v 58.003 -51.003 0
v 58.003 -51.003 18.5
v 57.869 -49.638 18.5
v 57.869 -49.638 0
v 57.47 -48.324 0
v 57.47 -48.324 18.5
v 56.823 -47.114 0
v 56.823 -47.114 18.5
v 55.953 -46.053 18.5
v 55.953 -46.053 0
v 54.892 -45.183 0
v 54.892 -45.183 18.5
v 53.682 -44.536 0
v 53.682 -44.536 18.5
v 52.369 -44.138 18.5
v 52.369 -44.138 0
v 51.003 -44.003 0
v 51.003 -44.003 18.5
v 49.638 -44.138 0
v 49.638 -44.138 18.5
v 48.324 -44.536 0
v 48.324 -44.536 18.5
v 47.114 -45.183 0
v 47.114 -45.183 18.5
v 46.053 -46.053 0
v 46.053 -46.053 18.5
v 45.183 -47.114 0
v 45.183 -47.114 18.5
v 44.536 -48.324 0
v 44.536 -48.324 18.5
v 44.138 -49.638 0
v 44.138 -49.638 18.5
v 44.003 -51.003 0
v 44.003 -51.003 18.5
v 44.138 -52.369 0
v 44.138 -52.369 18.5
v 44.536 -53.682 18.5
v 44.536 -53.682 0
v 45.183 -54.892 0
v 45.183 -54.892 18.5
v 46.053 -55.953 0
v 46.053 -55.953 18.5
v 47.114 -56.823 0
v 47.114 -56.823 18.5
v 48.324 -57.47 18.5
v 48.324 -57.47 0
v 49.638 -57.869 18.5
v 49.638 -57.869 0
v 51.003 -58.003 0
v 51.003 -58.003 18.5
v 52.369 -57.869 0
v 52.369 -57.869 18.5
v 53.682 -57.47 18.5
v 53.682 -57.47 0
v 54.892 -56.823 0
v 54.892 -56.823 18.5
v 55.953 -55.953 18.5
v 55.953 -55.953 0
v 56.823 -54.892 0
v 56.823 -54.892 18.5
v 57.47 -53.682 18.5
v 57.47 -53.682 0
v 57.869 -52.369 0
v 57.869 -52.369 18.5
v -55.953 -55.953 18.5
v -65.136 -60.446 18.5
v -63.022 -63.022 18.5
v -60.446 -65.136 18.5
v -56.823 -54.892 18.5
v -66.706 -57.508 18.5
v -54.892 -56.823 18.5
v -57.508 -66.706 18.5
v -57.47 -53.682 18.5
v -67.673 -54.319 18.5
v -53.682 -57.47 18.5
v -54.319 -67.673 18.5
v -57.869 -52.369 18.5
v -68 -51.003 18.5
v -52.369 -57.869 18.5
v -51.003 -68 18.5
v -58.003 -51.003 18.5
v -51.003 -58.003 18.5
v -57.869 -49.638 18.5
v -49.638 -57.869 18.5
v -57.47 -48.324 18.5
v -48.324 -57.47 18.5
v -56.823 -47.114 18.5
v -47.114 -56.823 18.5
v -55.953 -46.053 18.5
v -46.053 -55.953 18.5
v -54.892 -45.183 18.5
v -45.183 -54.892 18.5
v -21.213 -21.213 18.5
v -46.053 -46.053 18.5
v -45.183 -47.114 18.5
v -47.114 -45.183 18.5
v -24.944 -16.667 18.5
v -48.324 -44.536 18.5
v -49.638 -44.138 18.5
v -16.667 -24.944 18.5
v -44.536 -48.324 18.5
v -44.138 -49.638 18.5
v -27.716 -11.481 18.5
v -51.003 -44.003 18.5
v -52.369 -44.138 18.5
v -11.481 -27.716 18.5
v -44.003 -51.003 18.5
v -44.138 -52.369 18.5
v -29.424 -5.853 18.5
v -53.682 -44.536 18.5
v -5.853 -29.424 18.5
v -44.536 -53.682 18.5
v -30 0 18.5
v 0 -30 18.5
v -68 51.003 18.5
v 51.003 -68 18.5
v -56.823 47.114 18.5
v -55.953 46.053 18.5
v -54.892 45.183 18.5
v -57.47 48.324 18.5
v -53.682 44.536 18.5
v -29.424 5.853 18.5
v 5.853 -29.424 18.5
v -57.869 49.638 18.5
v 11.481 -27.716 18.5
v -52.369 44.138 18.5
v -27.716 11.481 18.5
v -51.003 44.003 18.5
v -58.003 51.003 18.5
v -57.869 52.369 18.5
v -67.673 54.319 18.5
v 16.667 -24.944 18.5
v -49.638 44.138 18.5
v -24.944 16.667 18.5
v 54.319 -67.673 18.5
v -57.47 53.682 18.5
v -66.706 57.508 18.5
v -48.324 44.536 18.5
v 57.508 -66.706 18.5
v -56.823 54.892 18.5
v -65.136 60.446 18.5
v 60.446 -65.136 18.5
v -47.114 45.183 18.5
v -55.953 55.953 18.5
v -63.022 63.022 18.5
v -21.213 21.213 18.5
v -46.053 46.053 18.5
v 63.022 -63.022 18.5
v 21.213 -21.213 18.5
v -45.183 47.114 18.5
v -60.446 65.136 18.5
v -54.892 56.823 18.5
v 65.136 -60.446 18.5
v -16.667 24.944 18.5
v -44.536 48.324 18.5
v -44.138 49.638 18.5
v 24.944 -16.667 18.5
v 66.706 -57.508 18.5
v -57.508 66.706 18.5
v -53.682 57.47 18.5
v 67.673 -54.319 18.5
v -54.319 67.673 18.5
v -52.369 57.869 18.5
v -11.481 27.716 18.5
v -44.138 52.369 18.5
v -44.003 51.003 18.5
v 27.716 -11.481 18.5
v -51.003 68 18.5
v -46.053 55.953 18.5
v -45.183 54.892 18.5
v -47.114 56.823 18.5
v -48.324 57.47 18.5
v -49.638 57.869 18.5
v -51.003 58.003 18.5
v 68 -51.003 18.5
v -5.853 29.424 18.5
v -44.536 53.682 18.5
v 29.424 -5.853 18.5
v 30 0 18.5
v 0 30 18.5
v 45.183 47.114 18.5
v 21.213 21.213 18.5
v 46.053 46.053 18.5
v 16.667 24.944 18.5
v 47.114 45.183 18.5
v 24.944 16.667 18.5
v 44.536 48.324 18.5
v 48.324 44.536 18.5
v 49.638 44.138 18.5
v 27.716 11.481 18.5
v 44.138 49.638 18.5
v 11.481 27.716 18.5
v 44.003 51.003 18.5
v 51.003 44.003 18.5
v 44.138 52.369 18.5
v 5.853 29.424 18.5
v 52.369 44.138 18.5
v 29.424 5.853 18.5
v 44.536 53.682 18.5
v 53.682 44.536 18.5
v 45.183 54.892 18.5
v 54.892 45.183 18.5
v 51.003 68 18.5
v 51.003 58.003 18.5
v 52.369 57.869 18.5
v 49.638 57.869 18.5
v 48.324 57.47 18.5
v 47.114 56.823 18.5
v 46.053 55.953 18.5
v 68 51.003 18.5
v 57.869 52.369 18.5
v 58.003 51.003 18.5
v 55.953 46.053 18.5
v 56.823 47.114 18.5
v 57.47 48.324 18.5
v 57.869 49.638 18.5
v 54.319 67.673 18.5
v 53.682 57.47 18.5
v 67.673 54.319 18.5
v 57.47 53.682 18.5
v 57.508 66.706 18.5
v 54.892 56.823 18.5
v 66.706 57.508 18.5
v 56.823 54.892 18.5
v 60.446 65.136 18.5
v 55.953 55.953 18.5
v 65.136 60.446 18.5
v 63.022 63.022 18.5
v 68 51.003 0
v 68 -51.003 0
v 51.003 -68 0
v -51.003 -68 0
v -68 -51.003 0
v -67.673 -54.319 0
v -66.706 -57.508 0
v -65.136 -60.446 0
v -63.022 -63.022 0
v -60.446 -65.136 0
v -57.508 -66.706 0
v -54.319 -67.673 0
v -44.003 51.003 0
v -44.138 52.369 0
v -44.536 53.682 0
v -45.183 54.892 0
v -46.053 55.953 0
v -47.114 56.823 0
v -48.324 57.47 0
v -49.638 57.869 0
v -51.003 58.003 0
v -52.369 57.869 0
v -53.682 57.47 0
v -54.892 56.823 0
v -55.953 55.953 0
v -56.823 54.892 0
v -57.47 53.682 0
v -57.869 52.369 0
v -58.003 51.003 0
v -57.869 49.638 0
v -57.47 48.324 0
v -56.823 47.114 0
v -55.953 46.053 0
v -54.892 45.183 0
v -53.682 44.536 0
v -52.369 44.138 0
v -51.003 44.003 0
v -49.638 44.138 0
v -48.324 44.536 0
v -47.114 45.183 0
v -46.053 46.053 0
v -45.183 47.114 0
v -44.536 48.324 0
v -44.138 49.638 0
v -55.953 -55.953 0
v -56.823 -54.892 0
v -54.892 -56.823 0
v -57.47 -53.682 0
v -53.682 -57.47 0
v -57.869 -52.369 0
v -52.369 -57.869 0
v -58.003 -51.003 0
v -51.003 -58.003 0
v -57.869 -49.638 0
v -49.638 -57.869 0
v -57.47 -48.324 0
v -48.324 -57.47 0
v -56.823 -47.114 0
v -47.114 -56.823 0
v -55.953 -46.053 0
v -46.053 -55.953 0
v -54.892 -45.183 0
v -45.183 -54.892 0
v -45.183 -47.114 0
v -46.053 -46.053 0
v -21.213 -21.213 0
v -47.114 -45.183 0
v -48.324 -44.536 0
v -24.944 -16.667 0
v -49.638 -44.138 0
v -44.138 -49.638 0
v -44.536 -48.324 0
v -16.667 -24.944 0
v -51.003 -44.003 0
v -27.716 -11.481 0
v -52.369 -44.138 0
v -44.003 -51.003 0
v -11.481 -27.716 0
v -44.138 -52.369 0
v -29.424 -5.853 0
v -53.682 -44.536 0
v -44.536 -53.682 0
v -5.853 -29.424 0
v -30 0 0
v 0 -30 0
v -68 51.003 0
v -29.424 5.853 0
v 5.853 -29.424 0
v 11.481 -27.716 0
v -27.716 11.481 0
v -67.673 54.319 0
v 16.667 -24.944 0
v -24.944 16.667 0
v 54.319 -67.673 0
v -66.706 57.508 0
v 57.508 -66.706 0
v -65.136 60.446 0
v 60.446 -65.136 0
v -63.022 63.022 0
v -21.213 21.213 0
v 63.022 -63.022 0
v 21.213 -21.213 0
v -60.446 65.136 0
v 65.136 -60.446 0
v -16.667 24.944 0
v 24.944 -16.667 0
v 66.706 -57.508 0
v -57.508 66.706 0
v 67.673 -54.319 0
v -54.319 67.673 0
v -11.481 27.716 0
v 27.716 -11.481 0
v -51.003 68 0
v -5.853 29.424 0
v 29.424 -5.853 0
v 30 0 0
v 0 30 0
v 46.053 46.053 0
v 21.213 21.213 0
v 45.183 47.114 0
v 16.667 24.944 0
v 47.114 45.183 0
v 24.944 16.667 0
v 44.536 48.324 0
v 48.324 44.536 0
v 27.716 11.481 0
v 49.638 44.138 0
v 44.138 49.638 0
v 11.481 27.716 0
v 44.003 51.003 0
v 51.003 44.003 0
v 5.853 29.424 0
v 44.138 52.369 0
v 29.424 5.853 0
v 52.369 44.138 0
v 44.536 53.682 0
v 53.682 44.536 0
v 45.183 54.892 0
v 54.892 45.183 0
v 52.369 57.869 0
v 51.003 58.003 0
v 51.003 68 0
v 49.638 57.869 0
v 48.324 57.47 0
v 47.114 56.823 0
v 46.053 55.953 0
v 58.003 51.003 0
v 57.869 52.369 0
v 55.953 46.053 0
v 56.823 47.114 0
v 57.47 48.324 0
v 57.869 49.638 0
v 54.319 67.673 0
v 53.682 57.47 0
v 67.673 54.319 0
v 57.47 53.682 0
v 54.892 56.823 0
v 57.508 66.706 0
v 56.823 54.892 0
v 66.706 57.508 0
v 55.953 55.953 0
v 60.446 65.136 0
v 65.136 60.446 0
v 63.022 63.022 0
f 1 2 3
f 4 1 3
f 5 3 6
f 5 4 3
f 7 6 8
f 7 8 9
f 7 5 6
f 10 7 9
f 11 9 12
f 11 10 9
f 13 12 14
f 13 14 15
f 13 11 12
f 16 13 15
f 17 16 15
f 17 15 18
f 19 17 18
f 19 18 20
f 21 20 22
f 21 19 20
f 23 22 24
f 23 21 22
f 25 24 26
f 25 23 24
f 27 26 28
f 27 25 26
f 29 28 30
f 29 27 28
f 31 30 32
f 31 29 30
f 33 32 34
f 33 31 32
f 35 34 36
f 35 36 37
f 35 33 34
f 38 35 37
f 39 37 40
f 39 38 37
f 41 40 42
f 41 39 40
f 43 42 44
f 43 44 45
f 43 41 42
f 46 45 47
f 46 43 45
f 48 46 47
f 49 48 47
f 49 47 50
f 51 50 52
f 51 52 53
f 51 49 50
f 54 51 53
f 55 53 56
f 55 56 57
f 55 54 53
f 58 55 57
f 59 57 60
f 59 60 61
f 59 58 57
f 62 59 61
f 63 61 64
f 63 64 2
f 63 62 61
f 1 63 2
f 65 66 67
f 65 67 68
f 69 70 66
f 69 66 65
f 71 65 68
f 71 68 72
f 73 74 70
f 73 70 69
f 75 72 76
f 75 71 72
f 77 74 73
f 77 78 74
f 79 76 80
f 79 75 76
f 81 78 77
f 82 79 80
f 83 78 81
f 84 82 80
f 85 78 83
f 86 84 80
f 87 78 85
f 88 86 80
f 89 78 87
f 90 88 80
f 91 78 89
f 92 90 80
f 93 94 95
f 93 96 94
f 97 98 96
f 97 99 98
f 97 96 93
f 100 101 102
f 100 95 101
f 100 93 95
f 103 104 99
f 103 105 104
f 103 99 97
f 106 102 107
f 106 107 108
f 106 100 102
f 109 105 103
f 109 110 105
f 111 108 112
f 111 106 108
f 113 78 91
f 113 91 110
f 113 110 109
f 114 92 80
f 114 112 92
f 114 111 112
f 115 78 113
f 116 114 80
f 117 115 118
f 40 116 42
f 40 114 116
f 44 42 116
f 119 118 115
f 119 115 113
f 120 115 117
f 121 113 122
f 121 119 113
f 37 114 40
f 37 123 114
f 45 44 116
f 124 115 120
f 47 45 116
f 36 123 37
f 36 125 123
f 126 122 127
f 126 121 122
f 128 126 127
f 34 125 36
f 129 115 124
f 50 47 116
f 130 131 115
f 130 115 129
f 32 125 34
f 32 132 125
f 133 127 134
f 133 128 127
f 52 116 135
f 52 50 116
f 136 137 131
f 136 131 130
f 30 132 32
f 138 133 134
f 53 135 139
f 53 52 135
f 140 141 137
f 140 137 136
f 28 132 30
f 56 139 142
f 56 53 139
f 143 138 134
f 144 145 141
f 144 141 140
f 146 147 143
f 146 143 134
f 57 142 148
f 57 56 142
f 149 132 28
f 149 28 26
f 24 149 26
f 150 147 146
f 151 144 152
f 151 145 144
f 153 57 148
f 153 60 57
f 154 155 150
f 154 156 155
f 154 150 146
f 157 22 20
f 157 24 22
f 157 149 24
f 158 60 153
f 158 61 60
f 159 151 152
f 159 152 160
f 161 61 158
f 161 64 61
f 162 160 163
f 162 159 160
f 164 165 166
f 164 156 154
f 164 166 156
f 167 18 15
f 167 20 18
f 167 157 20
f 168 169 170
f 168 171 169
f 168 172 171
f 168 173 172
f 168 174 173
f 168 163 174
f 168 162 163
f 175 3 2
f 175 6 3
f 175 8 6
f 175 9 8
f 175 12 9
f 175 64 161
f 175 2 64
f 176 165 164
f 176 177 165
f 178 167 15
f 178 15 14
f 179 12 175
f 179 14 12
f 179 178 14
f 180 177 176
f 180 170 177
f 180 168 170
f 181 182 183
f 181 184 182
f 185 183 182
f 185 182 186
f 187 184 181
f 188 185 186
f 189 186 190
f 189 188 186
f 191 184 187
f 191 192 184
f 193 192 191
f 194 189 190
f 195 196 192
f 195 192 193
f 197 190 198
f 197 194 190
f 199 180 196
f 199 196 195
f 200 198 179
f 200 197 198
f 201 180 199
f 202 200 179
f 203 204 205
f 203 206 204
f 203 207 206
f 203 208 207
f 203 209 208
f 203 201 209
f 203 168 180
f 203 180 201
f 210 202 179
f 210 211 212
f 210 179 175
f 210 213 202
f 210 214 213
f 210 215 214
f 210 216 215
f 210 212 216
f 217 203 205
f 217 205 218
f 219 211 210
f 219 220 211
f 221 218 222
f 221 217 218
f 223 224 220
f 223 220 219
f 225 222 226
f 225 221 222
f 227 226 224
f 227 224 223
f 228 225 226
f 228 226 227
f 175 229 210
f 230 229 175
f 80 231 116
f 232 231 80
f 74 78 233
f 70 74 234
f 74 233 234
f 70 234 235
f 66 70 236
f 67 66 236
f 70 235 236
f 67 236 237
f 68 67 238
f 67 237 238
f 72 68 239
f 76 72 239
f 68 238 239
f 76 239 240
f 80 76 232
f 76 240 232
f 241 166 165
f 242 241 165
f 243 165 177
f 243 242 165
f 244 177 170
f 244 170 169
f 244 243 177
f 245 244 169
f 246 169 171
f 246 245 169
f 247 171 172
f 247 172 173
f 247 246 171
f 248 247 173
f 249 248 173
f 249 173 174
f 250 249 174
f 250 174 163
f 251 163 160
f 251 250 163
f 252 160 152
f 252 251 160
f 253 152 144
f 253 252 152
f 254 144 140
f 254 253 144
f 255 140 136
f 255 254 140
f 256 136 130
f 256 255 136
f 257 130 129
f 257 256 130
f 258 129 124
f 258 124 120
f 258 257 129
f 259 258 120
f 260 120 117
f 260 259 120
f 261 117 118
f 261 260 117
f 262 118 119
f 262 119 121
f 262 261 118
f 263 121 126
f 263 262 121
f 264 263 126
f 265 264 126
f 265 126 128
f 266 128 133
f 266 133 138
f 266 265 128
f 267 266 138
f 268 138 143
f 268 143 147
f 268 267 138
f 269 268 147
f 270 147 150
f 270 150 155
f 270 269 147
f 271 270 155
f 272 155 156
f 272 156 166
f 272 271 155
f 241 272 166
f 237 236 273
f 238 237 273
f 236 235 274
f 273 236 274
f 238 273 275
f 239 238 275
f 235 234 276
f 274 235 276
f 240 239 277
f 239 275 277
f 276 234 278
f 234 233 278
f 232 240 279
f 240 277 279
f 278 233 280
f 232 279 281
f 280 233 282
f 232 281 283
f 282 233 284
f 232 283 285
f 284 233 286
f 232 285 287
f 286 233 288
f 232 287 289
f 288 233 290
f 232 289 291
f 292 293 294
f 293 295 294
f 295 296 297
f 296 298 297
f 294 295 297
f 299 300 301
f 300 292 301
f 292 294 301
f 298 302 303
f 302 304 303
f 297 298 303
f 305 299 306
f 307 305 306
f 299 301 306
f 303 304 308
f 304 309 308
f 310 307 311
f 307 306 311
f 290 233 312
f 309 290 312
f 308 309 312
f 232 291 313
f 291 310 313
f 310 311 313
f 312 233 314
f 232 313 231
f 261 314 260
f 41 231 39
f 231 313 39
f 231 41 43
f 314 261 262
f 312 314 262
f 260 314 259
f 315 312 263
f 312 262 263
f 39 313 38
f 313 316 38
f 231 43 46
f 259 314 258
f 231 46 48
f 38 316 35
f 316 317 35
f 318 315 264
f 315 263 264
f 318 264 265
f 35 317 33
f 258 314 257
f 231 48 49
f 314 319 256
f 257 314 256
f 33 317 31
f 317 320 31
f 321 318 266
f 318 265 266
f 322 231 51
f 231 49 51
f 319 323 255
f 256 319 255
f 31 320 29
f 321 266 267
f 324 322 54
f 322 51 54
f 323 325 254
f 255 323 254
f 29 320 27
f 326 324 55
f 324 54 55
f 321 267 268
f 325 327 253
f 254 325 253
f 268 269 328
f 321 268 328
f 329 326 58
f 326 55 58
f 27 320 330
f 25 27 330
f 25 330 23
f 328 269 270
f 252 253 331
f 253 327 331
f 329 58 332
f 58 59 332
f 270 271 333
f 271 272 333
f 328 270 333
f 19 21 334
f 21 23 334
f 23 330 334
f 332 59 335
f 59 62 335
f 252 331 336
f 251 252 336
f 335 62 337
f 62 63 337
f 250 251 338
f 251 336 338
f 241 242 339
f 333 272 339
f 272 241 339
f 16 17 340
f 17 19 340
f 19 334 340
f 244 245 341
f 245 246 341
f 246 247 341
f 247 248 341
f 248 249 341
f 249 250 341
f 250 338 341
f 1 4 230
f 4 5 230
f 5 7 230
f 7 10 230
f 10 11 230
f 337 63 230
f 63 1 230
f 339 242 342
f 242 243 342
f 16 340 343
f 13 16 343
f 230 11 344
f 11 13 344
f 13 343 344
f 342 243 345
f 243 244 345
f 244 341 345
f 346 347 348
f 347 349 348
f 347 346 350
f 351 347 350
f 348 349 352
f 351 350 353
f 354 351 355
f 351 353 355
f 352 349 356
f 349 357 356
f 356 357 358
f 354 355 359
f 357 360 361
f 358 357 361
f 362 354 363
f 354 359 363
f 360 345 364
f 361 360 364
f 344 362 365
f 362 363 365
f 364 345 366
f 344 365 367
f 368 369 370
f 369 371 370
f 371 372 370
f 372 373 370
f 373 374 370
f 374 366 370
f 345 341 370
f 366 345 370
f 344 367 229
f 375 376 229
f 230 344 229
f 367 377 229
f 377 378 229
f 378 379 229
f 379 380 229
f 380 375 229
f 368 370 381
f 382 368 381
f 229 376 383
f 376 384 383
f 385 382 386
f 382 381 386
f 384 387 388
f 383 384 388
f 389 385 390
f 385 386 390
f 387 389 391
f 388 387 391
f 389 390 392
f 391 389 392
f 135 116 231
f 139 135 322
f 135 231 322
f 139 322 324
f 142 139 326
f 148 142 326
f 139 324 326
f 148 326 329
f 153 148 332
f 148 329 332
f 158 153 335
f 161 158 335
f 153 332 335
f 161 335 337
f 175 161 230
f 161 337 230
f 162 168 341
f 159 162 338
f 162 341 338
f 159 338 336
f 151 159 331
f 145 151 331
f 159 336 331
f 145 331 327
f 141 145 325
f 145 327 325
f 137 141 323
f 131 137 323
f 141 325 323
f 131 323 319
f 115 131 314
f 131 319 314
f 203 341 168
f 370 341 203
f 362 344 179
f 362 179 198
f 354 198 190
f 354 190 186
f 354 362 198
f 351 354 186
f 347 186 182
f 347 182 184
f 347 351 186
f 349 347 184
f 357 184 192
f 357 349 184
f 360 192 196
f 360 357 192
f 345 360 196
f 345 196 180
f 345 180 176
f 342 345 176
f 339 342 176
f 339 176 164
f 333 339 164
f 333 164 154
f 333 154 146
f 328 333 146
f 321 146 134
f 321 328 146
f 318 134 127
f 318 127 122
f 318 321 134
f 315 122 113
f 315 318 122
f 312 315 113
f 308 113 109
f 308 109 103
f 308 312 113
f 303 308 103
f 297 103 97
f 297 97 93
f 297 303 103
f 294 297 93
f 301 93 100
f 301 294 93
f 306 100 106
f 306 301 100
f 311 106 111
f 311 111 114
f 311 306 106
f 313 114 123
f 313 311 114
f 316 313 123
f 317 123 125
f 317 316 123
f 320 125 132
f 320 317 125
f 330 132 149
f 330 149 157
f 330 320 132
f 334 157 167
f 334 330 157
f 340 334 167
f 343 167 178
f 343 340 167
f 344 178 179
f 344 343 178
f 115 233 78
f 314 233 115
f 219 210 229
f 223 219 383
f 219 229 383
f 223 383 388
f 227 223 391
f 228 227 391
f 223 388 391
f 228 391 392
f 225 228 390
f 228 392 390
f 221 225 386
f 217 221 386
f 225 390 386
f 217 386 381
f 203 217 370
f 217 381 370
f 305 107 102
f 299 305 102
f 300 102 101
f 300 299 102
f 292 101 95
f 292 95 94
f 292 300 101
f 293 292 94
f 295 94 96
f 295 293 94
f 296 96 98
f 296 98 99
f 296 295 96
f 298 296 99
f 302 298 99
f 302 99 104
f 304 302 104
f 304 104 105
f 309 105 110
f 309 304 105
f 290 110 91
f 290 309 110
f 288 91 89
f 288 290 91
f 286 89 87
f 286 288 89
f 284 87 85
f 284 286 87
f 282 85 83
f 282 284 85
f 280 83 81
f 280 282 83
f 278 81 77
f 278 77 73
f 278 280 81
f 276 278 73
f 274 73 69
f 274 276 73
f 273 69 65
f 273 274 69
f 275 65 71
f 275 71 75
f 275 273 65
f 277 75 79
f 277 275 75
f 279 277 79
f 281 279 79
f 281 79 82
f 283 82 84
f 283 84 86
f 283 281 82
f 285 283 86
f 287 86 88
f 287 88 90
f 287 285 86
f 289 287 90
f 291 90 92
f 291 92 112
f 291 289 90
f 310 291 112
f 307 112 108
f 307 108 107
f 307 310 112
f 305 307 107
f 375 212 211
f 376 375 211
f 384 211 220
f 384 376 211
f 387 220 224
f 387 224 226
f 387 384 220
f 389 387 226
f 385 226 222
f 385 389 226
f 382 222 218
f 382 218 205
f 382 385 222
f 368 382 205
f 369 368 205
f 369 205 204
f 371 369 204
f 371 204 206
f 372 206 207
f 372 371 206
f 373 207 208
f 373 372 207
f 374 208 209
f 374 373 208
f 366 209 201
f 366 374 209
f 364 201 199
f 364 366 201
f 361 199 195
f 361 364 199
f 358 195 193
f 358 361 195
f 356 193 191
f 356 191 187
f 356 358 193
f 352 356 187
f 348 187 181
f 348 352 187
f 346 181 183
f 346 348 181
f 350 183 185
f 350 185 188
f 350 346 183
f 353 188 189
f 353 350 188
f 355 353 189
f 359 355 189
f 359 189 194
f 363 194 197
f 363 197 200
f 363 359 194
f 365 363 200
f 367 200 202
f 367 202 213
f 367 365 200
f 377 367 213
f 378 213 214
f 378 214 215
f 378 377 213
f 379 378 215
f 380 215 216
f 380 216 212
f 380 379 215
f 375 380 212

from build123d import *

# Parameters (mm, degrees)
SKETCH001_R   = 7
SKETCH001_R_2 = 30
PAD_DEPTH     = 18.5


with BuildPart() as part:
    # Sketch001 → Pad (new body)
    with BuildSketch(Plane.XY):
        with BuildLine():
            ThreePointArc((-51.0032, 68), (-63.021753, 63.021753), (-68, 51.0032))
            Line((-68, -51.0032), (-68, 51.0032))
            ThreePointArc((-68, -51.0032), (-63.021753, -63.021753), (-51.0032, -68))
            Line((51.0032, -68), (-51.0032, -68))
            ThreePointArc((51.0032, -68), (63.021753, -63.021753), (68, -51.0032))
            Line((68, 51.0032), (68, -51.0032))
            ThreePointArc((68, 51.0032), (63.021753, 63.021753), (51.0032, 68))
            Line((-51.0032, 68), (51.0032, 68))
        make_face()
        with Locations((51.0032, 51.0032)):
            Circle(SKETCH001_R, mode=Mode.SUBTRACT)
        with Locations((-51.0032, 51.0032)):
            Circle(SKETCH001_R, mode=Mode.SUBTRACT)
        with Locations((-51.0032, -51.0032)):
            Circle(SKETCH001_R, mode=Mode.SUBTRACT)
        with Locations((51.0032, -51.0032)):
            Circle(SKETCH001_R, mode=Mode.SUBTRACT)
        Circle(SKETCH001_R_2, mode=Mode.SUBTRACT)
    extrude(amount=PAD_DEPTH)


solid = part.part
